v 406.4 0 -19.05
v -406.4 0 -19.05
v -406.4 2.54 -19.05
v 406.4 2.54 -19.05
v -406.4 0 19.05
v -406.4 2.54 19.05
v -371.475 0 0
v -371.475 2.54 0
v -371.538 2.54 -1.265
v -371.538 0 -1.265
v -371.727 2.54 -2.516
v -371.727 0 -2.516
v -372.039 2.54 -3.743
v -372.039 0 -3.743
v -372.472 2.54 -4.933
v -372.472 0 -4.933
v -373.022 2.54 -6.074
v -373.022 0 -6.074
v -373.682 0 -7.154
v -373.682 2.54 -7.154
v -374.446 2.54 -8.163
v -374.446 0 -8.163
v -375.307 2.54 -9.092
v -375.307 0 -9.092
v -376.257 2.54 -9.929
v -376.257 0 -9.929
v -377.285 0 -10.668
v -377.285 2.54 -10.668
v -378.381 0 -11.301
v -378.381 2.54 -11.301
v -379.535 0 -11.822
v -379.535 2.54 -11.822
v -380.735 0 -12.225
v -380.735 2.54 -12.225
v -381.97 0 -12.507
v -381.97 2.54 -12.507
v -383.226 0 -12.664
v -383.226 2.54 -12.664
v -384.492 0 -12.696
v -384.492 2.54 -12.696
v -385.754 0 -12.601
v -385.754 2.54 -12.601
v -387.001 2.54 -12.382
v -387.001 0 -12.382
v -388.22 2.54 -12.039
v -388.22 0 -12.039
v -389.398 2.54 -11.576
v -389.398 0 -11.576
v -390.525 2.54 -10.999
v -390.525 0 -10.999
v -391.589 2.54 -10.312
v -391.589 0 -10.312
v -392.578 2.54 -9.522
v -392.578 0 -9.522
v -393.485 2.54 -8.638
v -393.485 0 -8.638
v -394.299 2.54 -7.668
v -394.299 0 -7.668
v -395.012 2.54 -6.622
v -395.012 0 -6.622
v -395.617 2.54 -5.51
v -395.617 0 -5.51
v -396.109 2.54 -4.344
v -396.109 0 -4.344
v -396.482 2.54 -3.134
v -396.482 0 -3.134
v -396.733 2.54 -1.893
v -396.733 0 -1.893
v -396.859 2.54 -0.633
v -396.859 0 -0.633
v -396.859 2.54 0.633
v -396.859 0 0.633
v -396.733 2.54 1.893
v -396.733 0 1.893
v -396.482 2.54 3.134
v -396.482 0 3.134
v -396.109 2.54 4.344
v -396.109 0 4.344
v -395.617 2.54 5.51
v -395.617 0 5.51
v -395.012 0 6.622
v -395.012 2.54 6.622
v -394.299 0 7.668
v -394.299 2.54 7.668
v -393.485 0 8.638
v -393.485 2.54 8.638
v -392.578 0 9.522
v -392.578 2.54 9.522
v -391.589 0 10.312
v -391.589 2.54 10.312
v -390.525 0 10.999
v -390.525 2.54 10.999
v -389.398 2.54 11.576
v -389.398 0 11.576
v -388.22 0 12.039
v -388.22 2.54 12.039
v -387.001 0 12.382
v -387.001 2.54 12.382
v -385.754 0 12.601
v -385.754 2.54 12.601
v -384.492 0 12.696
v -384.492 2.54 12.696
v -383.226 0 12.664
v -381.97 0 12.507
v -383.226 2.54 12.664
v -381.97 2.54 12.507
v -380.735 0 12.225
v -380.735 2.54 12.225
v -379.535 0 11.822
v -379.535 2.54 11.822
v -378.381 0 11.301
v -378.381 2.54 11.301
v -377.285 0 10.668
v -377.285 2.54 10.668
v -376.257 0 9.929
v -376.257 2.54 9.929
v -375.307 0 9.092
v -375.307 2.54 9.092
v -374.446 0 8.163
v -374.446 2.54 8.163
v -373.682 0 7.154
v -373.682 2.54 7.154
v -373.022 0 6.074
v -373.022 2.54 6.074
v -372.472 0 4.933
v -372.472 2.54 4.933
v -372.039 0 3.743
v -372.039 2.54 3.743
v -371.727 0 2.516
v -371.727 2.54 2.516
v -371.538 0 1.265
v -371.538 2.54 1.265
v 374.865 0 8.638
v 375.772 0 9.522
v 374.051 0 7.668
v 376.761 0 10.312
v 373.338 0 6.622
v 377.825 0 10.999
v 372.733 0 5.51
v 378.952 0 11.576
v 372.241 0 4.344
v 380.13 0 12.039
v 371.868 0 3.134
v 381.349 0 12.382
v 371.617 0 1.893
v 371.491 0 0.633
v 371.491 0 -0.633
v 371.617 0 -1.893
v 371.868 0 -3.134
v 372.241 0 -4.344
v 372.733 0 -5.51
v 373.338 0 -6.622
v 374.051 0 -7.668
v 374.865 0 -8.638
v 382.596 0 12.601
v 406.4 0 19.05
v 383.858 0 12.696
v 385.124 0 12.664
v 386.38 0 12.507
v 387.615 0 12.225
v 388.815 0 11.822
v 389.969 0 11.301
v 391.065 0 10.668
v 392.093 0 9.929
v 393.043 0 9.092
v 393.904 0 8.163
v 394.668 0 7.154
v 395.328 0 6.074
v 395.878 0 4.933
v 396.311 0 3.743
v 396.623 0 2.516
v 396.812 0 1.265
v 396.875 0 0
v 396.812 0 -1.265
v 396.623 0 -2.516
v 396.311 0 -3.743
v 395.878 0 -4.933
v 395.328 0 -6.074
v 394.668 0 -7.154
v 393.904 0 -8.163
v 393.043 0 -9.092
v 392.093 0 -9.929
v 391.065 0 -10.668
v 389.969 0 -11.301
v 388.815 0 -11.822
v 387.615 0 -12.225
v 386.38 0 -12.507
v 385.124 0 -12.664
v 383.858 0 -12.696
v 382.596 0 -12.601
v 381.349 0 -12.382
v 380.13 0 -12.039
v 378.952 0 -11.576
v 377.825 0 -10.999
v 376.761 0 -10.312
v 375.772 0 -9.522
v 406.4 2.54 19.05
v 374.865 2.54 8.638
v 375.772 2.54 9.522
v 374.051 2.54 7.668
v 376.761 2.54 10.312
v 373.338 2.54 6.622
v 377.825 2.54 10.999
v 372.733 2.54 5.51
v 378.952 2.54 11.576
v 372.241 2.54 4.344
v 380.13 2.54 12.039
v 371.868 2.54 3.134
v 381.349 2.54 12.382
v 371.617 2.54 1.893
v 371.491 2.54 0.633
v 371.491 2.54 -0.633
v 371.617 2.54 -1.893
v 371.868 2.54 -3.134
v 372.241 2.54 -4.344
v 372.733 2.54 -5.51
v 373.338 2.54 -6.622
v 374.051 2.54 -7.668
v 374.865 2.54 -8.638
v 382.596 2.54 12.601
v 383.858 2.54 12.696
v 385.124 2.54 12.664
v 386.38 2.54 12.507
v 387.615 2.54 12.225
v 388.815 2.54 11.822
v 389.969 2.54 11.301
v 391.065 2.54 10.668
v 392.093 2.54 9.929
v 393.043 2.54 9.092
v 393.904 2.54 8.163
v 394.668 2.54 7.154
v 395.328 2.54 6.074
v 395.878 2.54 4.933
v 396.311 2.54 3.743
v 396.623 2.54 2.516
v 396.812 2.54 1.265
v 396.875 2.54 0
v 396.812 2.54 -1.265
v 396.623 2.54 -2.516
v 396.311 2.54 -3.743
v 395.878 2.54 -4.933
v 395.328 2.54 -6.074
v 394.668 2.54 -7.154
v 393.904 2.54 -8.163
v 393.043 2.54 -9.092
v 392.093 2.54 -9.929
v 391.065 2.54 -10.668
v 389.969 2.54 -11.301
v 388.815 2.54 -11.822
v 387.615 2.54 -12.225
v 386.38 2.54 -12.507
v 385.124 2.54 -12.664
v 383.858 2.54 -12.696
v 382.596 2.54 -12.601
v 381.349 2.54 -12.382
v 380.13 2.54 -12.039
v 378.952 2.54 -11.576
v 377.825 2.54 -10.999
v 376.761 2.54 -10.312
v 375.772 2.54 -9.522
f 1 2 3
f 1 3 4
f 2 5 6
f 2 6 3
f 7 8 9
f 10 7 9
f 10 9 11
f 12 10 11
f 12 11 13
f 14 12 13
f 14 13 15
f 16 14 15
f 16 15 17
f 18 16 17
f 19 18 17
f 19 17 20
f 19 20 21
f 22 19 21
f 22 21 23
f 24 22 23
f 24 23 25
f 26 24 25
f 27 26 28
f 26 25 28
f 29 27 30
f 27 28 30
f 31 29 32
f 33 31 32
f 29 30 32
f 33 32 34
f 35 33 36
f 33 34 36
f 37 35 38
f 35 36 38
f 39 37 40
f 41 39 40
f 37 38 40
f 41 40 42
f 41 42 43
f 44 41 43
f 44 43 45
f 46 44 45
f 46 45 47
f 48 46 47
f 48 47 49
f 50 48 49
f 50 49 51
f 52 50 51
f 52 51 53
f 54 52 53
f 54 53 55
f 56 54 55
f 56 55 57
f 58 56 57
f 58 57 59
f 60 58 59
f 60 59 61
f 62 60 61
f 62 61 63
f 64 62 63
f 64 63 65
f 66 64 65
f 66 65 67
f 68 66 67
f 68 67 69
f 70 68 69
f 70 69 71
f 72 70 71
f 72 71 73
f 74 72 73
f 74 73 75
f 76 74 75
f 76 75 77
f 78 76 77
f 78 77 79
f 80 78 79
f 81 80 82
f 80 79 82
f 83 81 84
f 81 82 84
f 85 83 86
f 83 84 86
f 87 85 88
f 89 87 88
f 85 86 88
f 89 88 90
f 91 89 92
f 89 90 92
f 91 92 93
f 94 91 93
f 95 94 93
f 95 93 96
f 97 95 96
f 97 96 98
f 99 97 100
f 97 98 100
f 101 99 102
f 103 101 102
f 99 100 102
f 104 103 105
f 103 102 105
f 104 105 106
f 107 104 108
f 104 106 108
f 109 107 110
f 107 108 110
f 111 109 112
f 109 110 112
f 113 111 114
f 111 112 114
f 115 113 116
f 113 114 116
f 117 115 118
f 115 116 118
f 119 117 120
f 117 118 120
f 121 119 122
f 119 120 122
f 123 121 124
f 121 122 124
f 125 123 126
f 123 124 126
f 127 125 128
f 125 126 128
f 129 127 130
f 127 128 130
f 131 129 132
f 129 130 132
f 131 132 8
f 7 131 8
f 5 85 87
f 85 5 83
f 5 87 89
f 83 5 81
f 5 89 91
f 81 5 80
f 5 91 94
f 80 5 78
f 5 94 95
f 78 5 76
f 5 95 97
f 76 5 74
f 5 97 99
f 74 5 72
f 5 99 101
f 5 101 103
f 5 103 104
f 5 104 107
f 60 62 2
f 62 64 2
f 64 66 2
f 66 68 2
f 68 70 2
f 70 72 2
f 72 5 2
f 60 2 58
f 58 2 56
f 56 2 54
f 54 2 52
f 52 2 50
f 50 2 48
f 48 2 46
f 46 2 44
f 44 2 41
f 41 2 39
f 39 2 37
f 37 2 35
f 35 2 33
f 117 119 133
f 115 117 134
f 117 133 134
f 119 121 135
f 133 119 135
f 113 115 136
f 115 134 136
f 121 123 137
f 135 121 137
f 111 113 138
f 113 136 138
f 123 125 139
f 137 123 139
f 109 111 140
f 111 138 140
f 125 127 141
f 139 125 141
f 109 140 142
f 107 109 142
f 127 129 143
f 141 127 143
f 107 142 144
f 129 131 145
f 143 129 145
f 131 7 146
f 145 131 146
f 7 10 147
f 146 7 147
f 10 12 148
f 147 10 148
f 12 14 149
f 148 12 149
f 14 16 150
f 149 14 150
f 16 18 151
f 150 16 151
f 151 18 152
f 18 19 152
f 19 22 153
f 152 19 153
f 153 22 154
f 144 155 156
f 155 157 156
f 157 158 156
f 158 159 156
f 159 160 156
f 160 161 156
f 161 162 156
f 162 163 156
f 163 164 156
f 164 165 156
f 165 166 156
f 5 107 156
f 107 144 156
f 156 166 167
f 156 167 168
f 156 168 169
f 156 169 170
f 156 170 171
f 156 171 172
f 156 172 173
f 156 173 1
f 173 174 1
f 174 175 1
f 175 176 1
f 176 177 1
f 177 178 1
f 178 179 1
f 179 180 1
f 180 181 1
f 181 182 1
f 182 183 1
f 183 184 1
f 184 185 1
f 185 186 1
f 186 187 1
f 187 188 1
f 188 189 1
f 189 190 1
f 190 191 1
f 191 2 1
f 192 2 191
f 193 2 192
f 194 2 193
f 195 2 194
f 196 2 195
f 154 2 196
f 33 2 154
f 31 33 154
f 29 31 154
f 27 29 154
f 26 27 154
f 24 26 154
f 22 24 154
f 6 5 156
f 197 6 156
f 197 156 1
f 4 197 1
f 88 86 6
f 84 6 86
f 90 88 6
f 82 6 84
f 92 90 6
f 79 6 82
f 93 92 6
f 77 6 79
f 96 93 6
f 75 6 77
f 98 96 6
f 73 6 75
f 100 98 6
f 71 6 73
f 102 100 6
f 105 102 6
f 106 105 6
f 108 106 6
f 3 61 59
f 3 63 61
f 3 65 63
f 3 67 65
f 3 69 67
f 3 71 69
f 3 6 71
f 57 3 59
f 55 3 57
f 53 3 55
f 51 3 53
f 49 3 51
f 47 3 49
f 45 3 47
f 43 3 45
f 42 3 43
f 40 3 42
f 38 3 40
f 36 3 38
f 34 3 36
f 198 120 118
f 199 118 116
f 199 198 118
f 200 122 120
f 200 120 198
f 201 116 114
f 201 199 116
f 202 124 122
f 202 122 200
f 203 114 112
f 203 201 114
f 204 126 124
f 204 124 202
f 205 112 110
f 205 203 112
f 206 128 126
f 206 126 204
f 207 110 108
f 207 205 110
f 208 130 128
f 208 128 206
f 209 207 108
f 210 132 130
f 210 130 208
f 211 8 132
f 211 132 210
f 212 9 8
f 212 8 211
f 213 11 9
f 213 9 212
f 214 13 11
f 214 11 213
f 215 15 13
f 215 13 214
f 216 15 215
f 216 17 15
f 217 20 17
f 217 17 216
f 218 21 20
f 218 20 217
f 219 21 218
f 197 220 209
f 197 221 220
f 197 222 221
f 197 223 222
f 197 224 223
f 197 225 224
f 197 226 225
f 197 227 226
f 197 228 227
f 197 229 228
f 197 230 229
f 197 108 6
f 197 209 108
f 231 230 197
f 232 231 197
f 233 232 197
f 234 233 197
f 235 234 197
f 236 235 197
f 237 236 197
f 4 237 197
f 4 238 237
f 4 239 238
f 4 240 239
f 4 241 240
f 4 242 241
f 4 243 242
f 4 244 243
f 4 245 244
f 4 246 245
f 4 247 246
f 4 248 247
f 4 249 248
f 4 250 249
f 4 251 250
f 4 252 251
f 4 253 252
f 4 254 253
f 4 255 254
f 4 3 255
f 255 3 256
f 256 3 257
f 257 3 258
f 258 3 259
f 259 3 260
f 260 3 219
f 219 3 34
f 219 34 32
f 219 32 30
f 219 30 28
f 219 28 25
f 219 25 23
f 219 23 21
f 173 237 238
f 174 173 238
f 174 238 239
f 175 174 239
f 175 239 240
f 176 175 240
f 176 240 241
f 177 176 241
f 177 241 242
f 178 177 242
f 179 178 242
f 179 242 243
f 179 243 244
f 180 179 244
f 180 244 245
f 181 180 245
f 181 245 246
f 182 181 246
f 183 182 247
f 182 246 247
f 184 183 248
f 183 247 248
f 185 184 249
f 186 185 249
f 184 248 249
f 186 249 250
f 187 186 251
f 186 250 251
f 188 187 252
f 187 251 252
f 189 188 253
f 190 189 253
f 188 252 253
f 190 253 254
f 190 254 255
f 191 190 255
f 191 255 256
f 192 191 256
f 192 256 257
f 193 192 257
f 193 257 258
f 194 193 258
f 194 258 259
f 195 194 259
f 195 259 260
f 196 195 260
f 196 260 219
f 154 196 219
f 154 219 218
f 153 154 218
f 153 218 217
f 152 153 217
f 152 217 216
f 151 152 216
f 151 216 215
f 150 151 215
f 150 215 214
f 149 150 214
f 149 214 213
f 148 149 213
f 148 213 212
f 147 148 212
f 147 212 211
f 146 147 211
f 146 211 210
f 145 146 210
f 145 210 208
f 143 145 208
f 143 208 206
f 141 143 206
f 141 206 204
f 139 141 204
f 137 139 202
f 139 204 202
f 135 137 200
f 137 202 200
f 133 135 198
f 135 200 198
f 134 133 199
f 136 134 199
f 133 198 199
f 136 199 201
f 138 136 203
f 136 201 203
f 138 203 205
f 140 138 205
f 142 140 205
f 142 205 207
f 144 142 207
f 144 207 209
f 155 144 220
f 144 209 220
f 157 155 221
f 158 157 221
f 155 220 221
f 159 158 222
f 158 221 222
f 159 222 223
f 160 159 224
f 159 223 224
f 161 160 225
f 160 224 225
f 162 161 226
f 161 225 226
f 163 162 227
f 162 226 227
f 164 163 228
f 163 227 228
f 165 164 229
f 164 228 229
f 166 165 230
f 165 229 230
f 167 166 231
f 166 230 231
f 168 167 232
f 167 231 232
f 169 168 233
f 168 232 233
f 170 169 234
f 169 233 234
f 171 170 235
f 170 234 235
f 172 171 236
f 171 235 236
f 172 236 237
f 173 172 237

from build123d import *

# Parameters (mm, degrees)
SKETCH1_W               = 812.8
SKETCH1_H               = 38.1
BOSS_EXTRUDE1_DEPTH     = 2.54
SKETCH2_R               = 12.7
CUT_EXTRUDE1_DEPTH      = 1
CUT_EXTRUDE1_DEPTH_BACK = 3.54


with BuildPart() as part:
    # Sketch1 → Boss-Extrude1 (new body)
    with BuildSketch(Plane(origin=(0, 0, 0), x_dir=(1, 0, 0), z_dir=(0, 1, 0))):
        Rectangle(SKETCH1_W, SKETCH1_H)
    extrude(amount=BOSS_EXTRUDE1_DEPTH)

    # Sketch2 → Cut-Extrude1 (cut, two sides)
    with BuildSketch(Plane(origin=(0, 2.54, 0), x_dir=(1, 0, 0), z_dir=(0, 1, 0))) as cut_extrude1_sk:
        with Locations((-384.175, 0)):
            Circle(SKETCH2_R)
        with Locations((384.175, 0)):
            Circle(SKETCH2_R)
    extrude(amount=CUT_EXTRUDE1_DEPTH, mode=Mode.SUBTRACT)
    extrude(cut_extrude1_sk.sketch, amount=-CUT_EXTRUDE1_DEPTH_BACK, mode=Mode.SUBTRACT)


solid = part.part
